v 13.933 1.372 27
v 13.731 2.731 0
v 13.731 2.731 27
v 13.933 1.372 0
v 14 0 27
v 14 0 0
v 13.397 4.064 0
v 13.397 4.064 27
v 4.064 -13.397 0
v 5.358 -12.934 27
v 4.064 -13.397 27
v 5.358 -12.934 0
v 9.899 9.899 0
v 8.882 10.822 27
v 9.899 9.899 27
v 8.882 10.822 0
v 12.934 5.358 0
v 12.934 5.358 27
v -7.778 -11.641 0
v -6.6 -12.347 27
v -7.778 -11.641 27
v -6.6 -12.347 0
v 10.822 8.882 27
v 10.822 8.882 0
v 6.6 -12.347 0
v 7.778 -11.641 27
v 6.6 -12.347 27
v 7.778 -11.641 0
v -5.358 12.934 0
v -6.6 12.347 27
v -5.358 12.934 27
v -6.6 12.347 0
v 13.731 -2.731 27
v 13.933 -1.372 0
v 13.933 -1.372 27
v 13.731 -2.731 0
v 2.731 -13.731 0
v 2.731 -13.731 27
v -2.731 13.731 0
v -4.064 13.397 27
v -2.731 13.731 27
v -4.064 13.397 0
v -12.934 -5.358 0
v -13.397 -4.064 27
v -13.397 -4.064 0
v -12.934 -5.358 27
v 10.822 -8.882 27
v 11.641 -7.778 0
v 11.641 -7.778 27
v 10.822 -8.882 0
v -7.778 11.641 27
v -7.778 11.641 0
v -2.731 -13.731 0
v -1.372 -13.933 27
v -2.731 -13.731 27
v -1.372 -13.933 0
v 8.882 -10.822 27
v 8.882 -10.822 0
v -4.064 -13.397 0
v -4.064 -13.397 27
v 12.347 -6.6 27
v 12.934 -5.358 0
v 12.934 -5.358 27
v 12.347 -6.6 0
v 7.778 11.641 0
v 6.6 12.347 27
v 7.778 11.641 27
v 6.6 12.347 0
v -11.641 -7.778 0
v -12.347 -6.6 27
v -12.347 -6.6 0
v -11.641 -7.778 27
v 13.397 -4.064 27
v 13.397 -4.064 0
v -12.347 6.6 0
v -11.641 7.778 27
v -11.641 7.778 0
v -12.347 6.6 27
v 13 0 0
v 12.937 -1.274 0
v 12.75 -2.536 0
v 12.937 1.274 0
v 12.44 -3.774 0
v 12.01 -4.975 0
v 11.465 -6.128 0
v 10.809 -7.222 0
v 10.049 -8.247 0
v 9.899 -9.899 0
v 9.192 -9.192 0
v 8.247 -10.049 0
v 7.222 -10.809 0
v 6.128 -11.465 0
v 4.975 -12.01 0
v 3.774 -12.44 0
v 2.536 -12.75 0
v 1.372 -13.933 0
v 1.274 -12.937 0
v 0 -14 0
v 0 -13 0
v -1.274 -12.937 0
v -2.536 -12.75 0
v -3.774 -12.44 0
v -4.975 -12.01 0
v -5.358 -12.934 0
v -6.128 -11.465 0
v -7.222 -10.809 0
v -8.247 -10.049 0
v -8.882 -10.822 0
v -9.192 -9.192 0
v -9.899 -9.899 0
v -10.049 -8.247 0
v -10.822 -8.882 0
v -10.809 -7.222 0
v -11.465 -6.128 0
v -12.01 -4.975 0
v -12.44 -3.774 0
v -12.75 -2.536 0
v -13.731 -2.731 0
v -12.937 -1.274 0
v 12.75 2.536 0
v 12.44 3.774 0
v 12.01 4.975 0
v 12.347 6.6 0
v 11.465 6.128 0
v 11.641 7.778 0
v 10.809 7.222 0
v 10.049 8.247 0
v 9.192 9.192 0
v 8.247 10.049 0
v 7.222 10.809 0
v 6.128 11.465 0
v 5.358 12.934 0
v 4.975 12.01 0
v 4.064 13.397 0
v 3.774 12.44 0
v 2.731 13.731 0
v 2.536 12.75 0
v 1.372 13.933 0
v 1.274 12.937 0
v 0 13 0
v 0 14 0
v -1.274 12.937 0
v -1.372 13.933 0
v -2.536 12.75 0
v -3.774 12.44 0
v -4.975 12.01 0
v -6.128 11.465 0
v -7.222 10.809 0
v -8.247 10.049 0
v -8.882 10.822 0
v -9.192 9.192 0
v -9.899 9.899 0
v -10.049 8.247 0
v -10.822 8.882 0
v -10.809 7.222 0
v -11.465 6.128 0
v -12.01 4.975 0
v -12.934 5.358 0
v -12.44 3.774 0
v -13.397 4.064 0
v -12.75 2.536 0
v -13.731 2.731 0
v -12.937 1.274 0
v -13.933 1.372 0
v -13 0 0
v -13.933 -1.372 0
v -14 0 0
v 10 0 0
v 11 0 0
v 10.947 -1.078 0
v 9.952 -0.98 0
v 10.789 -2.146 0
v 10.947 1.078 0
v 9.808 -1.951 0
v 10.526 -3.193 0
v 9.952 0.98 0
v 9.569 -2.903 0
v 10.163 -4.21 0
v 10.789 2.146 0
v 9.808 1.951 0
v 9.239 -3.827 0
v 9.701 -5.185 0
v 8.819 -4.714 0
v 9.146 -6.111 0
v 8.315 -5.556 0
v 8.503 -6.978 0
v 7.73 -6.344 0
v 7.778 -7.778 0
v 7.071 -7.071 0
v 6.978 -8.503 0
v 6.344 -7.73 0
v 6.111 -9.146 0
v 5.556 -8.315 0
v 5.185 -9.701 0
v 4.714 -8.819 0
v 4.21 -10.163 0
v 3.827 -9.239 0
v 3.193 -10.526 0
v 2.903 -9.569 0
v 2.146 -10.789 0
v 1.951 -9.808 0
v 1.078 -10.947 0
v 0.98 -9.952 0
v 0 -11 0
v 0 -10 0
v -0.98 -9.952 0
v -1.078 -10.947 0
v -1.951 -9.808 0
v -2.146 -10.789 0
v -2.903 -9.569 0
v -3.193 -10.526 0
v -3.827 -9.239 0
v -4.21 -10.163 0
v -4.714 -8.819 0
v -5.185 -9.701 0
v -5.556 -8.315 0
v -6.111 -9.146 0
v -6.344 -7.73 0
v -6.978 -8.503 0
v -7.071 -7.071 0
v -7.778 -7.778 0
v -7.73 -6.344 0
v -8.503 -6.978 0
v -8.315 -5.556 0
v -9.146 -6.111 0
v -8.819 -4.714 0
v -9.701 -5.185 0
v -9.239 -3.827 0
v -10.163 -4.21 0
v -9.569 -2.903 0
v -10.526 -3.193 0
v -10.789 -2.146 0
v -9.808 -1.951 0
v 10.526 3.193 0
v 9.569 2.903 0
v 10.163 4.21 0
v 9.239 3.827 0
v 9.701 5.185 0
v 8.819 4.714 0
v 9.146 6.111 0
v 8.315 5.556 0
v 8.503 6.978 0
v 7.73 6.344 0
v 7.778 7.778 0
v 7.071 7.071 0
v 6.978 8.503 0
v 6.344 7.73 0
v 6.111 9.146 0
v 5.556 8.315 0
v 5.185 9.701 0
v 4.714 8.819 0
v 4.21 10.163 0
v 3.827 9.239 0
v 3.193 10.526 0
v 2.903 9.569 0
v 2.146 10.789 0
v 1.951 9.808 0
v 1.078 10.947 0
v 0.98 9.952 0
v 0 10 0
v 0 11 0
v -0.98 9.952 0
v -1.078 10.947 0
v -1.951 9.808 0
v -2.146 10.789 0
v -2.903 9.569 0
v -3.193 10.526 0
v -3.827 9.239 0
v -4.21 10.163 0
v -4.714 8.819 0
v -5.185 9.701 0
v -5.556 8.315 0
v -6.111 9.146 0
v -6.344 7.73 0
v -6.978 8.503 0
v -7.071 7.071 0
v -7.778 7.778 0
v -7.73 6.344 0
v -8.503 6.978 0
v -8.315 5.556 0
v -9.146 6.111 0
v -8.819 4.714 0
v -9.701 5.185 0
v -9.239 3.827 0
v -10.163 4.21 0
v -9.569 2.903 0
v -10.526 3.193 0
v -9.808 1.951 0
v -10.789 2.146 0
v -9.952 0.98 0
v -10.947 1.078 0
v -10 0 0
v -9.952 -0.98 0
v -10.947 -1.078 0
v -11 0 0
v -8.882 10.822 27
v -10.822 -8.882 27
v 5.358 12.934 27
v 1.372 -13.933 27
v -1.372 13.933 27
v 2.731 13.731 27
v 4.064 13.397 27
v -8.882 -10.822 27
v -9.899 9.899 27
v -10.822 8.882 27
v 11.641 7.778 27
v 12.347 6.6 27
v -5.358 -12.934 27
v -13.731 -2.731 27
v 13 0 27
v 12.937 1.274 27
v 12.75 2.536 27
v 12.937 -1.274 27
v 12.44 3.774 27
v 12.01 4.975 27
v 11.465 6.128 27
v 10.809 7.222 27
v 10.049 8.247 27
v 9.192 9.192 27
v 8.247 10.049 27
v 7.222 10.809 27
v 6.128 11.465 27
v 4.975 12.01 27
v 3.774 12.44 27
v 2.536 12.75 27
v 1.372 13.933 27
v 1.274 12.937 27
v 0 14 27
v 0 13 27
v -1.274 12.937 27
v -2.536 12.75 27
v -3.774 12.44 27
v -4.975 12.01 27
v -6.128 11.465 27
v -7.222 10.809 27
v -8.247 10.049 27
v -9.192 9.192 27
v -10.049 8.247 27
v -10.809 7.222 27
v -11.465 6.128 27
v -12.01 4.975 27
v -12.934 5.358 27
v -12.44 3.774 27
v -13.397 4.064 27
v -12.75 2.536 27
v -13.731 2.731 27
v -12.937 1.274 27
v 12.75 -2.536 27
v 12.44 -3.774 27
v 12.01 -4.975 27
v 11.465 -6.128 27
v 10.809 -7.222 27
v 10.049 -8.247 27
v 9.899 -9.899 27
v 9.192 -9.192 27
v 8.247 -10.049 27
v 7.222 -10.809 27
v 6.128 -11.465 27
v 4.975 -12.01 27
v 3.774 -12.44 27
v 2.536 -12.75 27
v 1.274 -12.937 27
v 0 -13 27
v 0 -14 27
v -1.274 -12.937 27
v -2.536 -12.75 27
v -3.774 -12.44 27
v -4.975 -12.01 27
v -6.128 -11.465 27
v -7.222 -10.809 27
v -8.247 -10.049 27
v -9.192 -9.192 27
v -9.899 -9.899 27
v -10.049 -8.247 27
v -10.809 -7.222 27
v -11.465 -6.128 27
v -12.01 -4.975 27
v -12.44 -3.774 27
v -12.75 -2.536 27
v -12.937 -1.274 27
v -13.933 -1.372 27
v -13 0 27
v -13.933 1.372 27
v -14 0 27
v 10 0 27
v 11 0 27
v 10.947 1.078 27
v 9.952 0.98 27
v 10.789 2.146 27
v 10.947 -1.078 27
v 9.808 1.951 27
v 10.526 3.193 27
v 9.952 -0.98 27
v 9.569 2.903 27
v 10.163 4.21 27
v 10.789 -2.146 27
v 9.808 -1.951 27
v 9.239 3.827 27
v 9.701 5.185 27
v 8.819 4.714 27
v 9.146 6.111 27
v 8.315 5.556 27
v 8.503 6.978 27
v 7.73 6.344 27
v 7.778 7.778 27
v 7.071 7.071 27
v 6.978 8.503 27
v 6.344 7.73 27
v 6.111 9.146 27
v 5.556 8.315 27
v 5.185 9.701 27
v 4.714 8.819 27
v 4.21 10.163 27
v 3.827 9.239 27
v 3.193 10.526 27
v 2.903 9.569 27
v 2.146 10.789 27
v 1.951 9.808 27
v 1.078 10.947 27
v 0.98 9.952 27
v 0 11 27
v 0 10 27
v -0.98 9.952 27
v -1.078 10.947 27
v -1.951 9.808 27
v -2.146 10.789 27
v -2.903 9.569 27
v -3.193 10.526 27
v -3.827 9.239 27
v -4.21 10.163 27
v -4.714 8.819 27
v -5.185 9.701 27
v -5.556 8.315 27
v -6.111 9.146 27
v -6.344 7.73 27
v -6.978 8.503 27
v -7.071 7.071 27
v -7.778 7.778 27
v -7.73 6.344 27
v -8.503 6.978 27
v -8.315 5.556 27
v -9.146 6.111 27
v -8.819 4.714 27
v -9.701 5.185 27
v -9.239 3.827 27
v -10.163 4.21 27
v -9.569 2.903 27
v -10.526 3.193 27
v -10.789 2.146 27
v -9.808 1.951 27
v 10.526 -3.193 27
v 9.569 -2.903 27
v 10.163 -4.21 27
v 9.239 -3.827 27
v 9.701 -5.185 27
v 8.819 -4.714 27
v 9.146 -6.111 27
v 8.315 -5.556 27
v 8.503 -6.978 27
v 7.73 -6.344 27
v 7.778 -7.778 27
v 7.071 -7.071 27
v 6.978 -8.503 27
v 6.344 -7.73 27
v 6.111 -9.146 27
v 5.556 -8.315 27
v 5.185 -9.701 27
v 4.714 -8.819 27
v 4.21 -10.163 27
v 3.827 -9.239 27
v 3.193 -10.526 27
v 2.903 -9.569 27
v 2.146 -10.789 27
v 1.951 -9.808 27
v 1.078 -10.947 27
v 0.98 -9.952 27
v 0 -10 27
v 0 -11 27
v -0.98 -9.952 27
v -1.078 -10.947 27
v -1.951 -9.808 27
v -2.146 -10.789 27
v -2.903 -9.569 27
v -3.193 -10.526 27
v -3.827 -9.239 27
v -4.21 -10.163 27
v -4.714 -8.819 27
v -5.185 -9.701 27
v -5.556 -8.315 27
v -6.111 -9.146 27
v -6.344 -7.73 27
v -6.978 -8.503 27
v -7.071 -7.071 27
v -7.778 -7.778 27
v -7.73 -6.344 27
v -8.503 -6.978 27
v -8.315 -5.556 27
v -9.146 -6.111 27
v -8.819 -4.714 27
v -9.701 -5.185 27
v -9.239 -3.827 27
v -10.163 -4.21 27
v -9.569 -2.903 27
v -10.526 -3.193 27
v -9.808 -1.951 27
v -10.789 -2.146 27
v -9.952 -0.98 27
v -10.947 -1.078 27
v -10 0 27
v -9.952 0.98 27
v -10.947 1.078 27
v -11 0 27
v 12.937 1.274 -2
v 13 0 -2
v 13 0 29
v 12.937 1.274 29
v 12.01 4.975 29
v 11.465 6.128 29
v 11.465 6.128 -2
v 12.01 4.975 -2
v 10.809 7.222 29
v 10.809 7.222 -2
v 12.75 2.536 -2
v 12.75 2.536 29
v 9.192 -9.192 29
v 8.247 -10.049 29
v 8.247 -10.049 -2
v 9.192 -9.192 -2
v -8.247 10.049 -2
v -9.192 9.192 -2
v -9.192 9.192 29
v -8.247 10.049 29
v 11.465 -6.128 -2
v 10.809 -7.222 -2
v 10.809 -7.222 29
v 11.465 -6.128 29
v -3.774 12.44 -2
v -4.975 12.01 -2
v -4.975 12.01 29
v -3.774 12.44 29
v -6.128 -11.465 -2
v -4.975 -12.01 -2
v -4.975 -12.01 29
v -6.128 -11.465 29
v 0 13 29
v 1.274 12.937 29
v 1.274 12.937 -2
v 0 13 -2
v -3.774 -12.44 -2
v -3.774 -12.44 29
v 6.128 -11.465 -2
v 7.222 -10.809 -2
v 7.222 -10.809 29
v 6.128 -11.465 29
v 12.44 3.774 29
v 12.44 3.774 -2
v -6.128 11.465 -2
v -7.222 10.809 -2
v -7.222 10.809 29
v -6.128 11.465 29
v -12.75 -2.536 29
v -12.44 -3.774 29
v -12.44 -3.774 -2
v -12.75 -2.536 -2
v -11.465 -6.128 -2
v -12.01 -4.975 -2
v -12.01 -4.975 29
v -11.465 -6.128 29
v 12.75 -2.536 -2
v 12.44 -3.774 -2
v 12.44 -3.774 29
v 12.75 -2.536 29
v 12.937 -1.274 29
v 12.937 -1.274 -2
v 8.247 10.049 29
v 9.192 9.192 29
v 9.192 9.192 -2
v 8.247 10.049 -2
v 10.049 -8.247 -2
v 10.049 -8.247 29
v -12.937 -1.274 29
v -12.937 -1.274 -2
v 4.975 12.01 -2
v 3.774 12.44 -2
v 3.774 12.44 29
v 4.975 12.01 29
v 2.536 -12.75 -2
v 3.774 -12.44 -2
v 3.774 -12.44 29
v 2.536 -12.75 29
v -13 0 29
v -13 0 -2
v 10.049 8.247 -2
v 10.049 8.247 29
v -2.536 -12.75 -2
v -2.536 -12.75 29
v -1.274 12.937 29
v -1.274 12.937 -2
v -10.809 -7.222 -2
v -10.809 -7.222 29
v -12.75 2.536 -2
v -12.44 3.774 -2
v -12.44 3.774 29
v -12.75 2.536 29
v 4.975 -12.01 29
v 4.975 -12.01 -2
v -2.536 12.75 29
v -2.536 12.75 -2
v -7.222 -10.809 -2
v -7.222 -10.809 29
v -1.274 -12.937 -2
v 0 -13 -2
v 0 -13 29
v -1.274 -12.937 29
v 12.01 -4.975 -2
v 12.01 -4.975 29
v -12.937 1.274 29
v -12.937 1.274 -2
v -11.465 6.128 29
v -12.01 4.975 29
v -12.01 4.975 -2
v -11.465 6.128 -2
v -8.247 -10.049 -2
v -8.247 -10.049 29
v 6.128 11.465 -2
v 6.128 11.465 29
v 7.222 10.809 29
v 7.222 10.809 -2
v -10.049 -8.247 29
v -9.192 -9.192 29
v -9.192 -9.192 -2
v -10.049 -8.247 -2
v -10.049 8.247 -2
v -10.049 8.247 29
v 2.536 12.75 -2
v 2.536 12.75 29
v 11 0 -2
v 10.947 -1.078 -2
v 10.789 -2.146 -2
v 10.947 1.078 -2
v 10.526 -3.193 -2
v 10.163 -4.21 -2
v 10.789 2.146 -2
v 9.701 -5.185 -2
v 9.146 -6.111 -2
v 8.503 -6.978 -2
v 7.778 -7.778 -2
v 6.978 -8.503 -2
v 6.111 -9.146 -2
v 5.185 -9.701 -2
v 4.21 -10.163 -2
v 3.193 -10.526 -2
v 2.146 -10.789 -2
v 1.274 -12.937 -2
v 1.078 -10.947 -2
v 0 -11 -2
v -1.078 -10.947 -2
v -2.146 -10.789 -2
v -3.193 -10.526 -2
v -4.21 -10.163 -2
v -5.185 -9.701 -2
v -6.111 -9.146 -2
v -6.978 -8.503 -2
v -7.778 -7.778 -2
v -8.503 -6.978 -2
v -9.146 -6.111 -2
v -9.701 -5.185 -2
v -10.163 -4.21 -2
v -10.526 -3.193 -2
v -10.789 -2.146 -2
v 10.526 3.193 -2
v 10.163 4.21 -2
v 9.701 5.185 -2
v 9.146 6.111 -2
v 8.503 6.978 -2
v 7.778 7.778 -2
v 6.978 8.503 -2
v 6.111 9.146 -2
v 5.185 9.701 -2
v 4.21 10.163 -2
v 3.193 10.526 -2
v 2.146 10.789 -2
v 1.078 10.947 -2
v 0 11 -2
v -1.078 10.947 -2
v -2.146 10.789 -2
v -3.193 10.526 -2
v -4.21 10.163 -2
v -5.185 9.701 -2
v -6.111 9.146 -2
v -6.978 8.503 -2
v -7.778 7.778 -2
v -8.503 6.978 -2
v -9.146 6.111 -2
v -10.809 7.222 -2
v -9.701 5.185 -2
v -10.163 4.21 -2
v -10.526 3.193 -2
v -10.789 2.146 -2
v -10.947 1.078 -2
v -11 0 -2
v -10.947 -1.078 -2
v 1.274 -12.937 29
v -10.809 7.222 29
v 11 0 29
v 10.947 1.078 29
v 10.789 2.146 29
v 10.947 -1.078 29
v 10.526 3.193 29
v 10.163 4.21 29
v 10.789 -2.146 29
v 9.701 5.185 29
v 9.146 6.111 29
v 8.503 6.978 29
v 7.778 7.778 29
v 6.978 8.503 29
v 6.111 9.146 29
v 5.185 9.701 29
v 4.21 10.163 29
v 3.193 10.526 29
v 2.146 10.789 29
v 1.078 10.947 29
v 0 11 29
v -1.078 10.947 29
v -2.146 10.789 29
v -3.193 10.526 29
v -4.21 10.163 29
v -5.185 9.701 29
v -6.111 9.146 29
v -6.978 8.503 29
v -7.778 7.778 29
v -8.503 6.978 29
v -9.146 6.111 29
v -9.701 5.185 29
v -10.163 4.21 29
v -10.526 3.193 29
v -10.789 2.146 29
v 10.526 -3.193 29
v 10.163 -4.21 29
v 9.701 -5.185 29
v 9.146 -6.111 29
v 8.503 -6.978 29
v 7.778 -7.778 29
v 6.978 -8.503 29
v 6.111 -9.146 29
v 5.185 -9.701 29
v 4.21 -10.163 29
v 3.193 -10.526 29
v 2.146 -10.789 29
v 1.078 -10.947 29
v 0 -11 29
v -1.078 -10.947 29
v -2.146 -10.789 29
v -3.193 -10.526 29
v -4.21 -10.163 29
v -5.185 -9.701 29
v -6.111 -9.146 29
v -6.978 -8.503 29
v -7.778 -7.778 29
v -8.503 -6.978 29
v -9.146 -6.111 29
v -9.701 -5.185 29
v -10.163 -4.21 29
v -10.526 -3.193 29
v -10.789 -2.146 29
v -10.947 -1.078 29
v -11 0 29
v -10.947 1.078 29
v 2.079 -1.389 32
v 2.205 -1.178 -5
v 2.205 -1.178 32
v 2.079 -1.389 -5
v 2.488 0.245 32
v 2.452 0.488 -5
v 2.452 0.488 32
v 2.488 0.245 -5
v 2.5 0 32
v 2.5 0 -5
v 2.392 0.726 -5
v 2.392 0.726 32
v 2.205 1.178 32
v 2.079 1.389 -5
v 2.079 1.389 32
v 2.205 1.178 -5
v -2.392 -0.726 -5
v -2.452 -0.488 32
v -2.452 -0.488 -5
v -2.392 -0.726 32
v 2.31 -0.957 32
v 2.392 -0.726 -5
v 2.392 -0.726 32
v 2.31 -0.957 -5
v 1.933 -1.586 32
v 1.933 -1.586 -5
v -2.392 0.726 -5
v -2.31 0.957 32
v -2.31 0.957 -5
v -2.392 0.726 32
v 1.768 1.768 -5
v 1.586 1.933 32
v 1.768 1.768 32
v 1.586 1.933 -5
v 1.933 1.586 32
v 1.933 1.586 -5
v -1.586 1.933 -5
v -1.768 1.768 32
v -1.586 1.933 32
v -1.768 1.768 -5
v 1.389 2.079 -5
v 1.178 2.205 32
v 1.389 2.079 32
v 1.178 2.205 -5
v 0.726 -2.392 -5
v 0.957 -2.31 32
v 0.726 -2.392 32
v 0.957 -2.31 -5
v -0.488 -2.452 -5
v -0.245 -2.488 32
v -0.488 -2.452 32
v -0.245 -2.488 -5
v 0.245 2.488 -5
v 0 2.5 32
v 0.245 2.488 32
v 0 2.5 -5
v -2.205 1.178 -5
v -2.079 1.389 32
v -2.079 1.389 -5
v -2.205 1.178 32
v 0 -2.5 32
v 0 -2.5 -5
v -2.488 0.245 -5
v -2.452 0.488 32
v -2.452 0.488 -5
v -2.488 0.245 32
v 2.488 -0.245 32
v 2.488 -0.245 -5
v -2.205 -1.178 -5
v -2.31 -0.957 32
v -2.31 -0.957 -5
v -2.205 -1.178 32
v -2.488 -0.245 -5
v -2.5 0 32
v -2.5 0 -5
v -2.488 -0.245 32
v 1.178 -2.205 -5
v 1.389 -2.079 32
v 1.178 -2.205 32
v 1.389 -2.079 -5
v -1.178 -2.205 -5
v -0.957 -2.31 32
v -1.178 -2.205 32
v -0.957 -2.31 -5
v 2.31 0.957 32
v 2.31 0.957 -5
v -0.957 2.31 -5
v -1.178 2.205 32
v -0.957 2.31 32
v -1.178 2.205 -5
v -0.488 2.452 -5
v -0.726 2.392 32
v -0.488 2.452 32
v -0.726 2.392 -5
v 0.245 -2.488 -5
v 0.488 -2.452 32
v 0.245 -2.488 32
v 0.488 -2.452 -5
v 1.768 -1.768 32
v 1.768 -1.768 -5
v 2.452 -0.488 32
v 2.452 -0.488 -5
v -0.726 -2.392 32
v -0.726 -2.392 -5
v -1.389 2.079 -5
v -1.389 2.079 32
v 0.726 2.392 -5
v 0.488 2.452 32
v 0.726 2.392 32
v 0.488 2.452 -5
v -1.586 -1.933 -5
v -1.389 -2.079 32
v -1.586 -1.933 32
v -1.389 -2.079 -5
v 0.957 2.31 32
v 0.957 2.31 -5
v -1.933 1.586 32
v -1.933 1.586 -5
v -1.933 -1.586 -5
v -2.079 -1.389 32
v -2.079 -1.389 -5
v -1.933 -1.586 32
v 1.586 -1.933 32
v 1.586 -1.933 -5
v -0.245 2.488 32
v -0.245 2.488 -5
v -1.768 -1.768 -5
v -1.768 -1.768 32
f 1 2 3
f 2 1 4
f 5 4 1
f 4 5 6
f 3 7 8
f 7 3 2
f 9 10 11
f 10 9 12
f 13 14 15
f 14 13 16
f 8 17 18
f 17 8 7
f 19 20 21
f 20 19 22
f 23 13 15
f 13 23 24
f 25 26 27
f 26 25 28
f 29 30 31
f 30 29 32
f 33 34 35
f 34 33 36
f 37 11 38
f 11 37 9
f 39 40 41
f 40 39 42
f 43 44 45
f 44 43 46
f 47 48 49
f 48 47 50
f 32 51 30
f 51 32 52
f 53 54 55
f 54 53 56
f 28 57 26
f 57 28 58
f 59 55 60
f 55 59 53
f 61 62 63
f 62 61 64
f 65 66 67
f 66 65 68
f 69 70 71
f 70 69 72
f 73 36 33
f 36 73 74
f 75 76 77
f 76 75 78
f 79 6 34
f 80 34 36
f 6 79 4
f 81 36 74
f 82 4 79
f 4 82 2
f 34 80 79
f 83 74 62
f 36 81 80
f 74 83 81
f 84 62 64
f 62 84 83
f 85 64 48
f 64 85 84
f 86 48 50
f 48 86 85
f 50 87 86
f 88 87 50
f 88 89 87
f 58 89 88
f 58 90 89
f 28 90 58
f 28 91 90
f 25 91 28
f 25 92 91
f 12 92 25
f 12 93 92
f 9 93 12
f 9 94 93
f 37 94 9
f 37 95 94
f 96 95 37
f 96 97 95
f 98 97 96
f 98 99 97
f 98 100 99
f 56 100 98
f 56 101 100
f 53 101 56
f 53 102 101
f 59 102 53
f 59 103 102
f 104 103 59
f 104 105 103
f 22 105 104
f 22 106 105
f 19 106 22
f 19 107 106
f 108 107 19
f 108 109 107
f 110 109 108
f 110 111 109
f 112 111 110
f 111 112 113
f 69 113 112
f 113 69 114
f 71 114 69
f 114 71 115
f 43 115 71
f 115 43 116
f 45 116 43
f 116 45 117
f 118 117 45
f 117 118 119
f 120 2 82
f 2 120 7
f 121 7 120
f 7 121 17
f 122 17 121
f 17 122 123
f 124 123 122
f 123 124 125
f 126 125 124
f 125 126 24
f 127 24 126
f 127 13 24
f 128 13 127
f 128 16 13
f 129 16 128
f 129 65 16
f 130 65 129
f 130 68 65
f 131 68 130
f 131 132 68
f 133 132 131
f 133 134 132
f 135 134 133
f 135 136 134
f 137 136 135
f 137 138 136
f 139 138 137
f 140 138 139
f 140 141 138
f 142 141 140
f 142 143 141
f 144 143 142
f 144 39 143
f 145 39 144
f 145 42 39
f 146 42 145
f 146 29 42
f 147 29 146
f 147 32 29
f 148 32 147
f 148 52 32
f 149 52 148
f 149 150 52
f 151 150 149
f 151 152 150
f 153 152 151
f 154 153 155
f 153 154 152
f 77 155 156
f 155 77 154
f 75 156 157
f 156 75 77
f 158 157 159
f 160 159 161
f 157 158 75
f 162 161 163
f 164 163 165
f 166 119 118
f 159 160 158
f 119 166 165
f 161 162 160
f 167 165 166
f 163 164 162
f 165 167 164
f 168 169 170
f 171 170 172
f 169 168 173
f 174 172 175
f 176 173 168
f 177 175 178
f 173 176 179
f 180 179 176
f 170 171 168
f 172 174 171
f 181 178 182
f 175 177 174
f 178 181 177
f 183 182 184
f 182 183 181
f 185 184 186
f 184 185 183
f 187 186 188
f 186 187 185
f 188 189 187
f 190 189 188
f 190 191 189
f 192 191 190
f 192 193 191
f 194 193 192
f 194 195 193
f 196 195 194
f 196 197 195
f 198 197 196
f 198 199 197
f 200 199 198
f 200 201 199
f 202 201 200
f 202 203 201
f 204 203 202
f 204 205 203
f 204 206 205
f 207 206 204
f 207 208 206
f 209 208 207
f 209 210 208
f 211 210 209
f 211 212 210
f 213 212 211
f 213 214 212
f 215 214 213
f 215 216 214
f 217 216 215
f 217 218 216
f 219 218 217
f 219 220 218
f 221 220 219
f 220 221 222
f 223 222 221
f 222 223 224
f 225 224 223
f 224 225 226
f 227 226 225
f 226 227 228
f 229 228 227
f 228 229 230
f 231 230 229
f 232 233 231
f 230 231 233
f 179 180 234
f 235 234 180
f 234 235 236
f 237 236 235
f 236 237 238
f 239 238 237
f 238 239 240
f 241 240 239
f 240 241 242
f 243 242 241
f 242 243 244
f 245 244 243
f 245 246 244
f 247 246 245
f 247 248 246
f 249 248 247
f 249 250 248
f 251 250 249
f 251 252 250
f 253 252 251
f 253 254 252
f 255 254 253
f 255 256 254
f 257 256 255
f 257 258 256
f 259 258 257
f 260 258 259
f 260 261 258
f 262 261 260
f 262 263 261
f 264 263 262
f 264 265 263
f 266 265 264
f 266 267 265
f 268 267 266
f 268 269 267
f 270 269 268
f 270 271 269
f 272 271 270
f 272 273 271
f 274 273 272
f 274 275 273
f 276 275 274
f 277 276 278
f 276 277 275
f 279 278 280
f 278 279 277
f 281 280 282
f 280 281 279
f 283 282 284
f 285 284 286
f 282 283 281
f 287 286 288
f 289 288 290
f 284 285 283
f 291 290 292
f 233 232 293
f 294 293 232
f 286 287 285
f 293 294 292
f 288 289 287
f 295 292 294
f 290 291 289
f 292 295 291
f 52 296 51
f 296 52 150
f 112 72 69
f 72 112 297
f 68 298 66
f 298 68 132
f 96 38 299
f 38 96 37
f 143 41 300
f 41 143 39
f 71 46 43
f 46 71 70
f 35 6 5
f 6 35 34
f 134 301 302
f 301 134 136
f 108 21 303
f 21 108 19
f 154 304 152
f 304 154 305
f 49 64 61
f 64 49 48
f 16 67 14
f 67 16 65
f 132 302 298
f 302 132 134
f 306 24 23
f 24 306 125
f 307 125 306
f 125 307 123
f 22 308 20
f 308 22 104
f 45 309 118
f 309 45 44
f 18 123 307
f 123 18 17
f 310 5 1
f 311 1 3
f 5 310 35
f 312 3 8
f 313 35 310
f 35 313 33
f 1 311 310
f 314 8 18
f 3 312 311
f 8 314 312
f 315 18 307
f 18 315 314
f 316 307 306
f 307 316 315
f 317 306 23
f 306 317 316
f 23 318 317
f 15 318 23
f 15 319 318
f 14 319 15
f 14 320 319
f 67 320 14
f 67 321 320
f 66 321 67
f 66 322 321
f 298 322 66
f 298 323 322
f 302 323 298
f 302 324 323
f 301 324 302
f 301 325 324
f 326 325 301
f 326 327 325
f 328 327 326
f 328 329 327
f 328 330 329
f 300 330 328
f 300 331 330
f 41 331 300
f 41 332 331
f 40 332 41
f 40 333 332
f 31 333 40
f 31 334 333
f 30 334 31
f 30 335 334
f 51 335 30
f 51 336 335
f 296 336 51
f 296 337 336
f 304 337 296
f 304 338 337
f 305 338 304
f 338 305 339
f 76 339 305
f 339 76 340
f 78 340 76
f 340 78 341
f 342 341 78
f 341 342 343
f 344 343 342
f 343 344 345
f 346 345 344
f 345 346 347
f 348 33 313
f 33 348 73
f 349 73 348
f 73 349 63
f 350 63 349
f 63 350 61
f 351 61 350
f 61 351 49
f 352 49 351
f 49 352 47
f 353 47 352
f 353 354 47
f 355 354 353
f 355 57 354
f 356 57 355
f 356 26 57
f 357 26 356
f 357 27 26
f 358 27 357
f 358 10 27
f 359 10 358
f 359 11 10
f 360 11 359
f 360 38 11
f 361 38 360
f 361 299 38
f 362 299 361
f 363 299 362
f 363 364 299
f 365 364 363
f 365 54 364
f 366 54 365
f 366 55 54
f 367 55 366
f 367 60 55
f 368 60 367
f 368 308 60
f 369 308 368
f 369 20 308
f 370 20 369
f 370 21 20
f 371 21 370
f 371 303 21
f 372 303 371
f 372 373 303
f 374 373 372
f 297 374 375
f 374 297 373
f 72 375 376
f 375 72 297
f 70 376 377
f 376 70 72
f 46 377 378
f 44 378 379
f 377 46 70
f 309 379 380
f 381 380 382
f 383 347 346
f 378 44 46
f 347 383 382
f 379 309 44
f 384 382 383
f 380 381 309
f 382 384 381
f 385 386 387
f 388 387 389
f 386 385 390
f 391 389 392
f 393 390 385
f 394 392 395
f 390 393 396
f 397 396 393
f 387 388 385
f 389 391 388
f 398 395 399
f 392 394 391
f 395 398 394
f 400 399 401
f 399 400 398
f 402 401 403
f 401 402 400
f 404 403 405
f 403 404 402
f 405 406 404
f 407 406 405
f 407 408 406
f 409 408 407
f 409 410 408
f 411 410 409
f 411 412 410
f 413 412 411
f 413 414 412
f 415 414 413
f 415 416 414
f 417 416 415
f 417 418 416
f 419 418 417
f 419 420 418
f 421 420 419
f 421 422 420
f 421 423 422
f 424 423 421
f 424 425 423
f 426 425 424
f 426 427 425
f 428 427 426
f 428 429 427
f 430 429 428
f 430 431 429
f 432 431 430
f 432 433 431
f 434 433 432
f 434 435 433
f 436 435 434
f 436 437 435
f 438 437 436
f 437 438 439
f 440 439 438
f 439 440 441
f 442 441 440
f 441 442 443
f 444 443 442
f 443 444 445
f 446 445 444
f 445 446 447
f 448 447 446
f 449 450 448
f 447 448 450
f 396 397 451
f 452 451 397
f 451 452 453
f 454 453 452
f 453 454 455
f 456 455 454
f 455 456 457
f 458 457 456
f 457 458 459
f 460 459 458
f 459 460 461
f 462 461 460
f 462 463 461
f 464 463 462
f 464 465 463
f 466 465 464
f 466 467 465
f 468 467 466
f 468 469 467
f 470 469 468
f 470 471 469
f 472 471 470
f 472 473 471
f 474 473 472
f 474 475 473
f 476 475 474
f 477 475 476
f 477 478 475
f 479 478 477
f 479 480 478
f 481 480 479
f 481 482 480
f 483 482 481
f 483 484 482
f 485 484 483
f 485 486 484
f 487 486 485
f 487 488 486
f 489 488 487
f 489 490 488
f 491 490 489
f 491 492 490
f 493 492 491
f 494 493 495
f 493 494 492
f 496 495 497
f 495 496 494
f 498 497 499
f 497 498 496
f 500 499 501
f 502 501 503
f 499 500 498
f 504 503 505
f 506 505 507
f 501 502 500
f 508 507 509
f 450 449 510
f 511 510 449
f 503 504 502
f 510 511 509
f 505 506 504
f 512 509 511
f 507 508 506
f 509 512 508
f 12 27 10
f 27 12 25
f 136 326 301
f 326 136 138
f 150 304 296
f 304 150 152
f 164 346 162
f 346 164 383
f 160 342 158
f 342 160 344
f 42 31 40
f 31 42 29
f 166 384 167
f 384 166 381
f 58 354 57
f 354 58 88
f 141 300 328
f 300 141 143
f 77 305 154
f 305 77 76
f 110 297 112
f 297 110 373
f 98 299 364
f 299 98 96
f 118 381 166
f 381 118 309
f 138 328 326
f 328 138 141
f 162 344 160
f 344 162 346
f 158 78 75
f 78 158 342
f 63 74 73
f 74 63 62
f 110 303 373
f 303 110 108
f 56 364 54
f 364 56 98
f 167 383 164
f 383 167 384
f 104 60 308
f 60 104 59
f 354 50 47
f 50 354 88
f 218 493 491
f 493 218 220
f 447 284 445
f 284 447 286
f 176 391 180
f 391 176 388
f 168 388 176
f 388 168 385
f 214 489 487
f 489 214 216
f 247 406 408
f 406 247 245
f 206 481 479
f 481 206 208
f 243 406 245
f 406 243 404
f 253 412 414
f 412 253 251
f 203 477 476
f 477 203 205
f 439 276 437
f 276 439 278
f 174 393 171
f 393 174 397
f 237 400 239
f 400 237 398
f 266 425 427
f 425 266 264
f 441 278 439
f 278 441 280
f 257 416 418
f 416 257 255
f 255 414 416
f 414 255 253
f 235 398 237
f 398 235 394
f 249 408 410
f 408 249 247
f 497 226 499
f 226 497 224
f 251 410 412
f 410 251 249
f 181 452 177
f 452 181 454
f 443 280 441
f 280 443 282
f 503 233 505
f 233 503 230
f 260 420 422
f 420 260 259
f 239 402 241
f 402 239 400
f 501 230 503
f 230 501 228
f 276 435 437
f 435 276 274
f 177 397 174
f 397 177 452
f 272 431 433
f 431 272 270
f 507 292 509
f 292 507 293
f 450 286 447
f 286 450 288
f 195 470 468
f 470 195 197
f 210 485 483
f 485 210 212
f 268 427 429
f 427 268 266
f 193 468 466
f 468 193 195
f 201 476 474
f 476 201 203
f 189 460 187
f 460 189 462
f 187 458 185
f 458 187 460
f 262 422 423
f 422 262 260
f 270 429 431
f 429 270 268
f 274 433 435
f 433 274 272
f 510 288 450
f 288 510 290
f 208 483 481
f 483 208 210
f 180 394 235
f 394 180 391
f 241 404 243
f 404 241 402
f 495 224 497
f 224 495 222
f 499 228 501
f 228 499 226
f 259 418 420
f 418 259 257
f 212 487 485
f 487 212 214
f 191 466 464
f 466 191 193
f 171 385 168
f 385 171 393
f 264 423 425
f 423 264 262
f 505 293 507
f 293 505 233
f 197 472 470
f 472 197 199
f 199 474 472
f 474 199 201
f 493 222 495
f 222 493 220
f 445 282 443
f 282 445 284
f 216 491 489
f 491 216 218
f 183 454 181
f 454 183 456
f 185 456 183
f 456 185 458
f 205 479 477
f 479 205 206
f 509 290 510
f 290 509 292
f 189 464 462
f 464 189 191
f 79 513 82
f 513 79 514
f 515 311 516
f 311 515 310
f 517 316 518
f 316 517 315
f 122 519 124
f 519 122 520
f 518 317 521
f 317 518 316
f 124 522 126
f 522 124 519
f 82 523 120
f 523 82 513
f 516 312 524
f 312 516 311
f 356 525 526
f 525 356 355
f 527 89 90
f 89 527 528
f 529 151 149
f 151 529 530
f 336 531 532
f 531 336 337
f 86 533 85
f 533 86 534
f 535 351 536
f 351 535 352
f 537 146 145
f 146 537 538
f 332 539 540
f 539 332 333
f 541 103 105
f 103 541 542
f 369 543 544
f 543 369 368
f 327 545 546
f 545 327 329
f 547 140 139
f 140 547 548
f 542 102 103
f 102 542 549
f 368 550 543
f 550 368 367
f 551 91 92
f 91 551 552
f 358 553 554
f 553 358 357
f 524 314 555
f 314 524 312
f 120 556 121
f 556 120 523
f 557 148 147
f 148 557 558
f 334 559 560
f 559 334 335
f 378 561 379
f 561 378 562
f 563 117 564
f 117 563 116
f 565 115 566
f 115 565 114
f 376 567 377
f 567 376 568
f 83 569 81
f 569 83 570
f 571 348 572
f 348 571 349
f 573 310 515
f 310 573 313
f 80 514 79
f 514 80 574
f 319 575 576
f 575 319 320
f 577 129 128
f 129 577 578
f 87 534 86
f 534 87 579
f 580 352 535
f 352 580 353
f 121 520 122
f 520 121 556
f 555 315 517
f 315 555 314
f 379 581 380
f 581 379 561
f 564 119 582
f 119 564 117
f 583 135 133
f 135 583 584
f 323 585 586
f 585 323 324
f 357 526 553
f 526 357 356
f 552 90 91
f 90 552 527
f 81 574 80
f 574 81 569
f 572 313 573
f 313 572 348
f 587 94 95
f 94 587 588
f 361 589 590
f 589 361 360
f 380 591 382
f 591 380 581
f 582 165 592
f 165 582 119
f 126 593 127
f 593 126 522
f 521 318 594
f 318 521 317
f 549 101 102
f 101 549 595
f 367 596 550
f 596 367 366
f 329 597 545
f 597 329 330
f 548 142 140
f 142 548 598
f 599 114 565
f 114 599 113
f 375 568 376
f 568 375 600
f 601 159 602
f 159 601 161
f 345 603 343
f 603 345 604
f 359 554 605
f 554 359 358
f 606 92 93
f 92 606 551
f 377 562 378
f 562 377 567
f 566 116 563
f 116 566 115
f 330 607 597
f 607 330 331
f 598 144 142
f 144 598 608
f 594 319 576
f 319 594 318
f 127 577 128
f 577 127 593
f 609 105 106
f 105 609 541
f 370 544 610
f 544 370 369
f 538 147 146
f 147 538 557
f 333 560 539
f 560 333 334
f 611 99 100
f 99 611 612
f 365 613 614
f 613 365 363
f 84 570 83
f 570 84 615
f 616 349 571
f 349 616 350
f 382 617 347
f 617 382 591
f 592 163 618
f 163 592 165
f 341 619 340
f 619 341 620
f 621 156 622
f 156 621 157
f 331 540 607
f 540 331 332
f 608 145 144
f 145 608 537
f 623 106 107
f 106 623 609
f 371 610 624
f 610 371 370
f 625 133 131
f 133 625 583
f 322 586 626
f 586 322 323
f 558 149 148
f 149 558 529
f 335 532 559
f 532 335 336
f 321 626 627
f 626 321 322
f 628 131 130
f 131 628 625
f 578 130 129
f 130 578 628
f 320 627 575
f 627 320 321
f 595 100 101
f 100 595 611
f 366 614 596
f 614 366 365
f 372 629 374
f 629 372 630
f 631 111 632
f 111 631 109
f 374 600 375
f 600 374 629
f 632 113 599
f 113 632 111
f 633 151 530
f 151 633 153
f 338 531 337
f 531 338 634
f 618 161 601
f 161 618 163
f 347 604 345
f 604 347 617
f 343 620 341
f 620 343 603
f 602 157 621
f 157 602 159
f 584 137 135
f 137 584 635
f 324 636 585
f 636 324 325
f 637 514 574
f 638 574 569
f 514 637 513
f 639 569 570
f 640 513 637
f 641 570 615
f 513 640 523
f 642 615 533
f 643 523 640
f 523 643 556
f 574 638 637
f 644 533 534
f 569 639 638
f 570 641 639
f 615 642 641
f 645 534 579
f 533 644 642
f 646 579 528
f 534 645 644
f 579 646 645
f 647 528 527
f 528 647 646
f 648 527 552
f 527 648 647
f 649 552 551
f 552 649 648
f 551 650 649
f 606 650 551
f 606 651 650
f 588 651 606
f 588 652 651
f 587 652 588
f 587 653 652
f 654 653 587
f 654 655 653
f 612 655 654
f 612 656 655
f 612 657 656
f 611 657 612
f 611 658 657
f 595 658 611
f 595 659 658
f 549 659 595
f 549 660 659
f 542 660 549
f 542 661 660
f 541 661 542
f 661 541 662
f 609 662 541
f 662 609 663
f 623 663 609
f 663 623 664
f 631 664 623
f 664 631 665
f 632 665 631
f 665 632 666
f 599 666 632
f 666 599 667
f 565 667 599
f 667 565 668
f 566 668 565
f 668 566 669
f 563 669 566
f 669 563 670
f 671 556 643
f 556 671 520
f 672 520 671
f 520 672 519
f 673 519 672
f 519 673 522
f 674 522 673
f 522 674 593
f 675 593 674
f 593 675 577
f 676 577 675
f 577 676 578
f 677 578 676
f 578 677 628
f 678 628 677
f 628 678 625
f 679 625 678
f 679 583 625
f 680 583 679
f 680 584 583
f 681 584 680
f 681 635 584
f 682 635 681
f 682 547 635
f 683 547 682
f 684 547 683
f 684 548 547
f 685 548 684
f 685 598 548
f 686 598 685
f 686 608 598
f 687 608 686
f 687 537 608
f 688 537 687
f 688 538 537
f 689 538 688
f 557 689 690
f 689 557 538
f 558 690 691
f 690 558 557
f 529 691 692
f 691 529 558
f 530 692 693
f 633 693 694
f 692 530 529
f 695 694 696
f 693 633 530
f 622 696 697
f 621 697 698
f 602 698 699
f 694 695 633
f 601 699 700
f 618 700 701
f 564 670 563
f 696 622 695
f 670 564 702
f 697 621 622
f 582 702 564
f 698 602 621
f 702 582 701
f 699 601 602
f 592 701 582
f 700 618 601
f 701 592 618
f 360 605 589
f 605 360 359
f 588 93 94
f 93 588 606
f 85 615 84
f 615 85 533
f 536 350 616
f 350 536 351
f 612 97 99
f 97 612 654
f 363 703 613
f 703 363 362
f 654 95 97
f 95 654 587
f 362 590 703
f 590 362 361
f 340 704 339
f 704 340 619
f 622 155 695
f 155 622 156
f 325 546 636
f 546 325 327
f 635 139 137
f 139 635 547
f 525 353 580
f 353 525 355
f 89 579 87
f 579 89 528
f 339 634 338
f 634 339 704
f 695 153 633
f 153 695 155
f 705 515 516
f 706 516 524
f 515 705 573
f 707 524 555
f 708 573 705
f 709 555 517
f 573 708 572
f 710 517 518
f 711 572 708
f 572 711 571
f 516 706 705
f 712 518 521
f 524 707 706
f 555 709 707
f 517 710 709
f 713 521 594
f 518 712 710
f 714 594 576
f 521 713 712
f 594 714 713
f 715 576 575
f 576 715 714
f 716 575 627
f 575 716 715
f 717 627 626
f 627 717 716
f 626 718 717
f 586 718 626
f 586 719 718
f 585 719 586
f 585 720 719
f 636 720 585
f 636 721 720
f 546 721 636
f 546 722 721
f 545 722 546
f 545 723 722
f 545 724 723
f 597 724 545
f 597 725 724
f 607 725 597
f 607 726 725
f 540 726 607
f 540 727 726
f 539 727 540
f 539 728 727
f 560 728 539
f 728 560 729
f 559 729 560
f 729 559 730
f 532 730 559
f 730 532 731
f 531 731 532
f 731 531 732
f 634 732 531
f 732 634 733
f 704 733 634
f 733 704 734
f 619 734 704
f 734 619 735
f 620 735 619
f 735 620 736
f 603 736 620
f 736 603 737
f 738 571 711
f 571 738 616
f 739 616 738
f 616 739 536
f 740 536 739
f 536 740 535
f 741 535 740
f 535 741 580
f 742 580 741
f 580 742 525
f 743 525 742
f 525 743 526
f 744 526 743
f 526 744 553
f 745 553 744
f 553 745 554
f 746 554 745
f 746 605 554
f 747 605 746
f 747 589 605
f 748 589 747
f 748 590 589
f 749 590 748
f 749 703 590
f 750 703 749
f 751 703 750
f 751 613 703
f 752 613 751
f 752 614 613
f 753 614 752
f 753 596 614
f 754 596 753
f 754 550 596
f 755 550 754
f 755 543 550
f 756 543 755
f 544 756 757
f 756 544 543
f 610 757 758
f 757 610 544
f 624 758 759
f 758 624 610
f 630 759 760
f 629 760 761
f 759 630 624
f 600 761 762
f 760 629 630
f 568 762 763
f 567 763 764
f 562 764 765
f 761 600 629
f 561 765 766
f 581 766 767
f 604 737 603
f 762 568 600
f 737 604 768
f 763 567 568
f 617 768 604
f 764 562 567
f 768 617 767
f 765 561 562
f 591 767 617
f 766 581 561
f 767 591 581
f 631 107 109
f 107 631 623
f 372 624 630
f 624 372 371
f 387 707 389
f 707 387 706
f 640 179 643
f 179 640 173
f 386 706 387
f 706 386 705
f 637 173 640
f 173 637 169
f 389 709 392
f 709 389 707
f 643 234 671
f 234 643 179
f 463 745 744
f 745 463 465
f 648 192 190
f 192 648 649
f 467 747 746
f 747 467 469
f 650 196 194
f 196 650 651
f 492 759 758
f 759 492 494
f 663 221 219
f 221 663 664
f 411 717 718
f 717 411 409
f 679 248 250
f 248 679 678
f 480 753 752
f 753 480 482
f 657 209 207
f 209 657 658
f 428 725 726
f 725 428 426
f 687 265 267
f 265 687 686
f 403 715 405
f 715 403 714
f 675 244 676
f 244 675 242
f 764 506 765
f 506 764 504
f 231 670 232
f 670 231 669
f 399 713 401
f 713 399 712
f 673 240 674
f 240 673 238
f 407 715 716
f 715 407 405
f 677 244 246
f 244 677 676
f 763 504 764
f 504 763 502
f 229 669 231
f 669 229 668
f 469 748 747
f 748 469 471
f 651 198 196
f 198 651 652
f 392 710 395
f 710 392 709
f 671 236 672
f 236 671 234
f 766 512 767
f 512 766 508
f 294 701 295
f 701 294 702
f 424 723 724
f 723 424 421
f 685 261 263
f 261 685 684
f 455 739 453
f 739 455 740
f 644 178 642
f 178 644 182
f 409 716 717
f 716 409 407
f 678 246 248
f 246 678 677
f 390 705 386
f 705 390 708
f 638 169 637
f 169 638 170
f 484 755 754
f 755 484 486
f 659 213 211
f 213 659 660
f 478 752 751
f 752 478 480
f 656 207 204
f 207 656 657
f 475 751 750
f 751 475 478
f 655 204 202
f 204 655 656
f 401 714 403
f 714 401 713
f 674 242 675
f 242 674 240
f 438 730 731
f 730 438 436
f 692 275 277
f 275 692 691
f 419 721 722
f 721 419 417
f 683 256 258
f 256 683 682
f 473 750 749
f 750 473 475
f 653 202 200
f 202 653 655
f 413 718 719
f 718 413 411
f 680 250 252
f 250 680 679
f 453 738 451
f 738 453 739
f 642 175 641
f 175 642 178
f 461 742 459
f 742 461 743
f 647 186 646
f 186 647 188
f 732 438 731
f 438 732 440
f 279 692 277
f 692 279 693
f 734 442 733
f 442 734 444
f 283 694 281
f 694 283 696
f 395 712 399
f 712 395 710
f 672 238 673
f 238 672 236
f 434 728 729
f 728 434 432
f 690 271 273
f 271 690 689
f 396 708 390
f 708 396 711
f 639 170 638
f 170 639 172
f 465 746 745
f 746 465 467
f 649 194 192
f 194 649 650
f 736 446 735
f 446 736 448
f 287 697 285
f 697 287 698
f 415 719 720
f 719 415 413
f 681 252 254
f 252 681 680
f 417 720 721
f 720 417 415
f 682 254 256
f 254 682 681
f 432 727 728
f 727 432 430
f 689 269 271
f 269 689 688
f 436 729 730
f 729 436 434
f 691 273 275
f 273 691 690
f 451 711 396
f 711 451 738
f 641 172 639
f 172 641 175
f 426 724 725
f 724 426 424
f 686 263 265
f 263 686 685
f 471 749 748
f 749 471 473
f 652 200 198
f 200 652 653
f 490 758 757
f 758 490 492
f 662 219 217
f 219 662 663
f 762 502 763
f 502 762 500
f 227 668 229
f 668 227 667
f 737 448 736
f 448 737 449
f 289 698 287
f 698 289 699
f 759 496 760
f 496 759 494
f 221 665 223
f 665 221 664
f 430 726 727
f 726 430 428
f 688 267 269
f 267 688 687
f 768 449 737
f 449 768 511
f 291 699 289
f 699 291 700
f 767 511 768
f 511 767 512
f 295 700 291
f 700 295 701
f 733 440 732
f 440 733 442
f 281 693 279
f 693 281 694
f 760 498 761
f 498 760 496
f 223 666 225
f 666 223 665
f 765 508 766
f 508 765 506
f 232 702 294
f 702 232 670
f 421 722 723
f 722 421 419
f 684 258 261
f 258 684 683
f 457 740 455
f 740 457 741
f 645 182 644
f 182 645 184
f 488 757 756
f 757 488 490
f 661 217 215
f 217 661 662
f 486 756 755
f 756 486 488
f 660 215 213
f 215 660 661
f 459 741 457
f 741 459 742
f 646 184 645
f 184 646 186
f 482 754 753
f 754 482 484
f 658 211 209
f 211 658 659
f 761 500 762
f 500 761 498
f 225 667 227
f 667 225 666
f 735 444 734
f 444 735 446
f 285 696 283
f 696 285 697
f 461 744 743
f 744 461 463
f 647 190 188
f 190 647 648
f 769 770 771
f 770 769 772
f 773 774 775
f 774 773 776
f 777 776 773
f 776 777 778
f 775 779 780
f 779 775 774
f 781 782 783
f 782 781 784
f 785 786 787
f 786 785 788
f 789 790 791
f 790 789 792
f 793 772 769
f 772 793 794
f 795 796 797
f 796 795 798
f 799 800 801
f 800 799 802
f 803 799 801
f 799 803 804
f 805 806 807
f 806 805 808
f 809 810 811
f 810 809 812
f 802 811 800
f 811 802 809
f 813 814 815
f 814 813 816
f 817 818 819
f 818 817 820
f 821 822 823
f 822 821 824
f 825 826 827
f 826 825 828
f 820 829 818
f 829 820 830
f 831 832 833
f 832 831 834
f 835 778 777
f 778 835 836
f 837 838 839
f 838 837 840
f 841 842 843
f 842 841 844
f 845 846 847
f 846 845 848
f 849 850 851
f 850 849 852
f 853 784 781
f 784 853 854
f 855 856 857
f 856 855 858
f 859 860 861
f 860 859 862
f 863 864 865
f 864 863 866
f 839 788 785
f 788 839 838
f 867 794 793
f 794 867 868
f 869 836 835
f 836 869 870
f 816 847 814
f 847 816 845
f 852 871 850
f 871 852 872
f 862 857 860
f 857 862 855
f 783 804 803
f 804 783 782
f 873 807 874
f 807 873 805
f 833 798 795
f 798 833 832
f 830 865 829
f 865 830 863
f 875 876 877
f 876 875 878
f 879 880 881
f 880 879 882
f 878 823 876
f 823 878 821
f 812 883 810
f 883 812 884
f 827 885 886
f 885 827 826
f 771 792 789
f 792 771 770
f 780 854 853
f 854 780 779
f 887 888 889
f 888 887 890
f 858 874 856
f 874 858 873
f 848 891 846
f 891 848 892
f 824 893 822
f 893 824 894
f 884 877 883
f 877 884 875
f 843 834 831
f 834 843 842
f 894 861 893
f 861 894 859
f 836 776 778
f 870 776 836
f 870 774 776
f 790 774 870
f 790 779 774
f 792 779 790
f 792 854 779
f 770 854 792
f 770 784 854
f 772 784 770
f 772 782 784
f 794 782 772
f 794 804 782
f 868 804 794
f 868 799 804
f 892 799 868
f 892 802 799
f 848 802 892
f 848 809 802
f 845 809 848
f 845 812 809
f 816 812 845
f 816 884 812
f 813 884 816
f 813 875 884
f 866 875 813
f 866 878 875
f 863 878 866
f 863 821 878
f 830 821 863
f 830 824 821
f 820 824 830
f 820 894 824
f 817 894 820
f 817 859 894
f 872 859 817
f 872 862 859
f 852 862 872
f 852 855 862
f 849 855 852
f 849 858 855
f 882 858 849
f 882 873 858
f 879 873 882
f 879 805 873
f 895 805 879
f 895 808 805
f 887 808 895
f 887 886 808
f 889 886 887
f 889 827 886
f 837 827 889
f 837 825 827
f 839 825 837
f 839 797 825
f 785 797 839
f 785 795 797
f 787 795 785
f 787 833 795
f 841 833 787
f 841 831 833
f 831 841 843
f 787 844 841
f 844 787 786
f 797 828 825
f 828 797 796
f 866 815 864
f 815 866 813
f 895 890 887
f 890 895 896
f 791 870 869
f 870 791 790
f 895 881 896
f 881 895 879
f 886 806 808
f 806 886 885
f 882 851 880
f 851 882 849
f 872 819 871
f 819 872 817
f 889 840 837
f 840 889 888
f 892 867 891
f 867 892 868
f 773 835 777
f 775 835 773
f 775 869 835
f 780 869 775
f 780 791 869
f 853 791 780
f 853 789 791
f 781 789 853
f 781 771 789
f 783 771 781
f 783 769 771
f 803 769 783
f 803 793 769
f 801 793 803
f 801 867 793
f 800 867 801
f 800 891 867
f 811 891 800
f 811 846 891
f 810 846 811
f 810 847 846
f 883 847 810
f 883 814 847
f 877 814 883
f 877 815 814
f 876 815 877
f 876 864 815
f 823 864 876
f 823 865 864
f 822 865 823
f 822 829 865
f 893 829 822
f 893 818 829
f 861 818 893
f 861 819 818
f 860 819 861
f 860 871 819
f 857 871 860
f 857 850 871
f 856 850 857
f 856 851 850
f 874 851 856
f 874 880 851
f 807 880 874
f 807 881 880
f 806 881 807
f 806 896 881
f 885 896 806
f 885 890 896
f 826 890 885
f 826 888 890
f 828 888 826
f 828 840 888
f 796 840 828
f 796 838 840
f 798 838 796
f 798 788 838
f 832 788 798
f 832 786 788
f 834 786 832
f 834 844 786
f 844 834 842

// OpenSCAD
module brushless_dc_motor() {
    // Stator
    difference() {
        cylinder(h = 27.0, d = 28.0, $fn = 64);
        cylinder(h = 27.0, d = 20.0, $fn = 64);
    }
    
    // Rotor
    translate([0, 0, -2.0])
    difference() {
        cylinder(h = 31.0, d = 26.0, $fn = 64);
        translate([0, 0, -1.0])
        cylinder(h = 33.0, d = 22.0, $fn = 64);
    }
    
    // Shaft
    translate([0, 0, -5.0])
    cylinder(h = 37.0, d = 5.0, $fn = 64);
}

brushless_dc_motor();
